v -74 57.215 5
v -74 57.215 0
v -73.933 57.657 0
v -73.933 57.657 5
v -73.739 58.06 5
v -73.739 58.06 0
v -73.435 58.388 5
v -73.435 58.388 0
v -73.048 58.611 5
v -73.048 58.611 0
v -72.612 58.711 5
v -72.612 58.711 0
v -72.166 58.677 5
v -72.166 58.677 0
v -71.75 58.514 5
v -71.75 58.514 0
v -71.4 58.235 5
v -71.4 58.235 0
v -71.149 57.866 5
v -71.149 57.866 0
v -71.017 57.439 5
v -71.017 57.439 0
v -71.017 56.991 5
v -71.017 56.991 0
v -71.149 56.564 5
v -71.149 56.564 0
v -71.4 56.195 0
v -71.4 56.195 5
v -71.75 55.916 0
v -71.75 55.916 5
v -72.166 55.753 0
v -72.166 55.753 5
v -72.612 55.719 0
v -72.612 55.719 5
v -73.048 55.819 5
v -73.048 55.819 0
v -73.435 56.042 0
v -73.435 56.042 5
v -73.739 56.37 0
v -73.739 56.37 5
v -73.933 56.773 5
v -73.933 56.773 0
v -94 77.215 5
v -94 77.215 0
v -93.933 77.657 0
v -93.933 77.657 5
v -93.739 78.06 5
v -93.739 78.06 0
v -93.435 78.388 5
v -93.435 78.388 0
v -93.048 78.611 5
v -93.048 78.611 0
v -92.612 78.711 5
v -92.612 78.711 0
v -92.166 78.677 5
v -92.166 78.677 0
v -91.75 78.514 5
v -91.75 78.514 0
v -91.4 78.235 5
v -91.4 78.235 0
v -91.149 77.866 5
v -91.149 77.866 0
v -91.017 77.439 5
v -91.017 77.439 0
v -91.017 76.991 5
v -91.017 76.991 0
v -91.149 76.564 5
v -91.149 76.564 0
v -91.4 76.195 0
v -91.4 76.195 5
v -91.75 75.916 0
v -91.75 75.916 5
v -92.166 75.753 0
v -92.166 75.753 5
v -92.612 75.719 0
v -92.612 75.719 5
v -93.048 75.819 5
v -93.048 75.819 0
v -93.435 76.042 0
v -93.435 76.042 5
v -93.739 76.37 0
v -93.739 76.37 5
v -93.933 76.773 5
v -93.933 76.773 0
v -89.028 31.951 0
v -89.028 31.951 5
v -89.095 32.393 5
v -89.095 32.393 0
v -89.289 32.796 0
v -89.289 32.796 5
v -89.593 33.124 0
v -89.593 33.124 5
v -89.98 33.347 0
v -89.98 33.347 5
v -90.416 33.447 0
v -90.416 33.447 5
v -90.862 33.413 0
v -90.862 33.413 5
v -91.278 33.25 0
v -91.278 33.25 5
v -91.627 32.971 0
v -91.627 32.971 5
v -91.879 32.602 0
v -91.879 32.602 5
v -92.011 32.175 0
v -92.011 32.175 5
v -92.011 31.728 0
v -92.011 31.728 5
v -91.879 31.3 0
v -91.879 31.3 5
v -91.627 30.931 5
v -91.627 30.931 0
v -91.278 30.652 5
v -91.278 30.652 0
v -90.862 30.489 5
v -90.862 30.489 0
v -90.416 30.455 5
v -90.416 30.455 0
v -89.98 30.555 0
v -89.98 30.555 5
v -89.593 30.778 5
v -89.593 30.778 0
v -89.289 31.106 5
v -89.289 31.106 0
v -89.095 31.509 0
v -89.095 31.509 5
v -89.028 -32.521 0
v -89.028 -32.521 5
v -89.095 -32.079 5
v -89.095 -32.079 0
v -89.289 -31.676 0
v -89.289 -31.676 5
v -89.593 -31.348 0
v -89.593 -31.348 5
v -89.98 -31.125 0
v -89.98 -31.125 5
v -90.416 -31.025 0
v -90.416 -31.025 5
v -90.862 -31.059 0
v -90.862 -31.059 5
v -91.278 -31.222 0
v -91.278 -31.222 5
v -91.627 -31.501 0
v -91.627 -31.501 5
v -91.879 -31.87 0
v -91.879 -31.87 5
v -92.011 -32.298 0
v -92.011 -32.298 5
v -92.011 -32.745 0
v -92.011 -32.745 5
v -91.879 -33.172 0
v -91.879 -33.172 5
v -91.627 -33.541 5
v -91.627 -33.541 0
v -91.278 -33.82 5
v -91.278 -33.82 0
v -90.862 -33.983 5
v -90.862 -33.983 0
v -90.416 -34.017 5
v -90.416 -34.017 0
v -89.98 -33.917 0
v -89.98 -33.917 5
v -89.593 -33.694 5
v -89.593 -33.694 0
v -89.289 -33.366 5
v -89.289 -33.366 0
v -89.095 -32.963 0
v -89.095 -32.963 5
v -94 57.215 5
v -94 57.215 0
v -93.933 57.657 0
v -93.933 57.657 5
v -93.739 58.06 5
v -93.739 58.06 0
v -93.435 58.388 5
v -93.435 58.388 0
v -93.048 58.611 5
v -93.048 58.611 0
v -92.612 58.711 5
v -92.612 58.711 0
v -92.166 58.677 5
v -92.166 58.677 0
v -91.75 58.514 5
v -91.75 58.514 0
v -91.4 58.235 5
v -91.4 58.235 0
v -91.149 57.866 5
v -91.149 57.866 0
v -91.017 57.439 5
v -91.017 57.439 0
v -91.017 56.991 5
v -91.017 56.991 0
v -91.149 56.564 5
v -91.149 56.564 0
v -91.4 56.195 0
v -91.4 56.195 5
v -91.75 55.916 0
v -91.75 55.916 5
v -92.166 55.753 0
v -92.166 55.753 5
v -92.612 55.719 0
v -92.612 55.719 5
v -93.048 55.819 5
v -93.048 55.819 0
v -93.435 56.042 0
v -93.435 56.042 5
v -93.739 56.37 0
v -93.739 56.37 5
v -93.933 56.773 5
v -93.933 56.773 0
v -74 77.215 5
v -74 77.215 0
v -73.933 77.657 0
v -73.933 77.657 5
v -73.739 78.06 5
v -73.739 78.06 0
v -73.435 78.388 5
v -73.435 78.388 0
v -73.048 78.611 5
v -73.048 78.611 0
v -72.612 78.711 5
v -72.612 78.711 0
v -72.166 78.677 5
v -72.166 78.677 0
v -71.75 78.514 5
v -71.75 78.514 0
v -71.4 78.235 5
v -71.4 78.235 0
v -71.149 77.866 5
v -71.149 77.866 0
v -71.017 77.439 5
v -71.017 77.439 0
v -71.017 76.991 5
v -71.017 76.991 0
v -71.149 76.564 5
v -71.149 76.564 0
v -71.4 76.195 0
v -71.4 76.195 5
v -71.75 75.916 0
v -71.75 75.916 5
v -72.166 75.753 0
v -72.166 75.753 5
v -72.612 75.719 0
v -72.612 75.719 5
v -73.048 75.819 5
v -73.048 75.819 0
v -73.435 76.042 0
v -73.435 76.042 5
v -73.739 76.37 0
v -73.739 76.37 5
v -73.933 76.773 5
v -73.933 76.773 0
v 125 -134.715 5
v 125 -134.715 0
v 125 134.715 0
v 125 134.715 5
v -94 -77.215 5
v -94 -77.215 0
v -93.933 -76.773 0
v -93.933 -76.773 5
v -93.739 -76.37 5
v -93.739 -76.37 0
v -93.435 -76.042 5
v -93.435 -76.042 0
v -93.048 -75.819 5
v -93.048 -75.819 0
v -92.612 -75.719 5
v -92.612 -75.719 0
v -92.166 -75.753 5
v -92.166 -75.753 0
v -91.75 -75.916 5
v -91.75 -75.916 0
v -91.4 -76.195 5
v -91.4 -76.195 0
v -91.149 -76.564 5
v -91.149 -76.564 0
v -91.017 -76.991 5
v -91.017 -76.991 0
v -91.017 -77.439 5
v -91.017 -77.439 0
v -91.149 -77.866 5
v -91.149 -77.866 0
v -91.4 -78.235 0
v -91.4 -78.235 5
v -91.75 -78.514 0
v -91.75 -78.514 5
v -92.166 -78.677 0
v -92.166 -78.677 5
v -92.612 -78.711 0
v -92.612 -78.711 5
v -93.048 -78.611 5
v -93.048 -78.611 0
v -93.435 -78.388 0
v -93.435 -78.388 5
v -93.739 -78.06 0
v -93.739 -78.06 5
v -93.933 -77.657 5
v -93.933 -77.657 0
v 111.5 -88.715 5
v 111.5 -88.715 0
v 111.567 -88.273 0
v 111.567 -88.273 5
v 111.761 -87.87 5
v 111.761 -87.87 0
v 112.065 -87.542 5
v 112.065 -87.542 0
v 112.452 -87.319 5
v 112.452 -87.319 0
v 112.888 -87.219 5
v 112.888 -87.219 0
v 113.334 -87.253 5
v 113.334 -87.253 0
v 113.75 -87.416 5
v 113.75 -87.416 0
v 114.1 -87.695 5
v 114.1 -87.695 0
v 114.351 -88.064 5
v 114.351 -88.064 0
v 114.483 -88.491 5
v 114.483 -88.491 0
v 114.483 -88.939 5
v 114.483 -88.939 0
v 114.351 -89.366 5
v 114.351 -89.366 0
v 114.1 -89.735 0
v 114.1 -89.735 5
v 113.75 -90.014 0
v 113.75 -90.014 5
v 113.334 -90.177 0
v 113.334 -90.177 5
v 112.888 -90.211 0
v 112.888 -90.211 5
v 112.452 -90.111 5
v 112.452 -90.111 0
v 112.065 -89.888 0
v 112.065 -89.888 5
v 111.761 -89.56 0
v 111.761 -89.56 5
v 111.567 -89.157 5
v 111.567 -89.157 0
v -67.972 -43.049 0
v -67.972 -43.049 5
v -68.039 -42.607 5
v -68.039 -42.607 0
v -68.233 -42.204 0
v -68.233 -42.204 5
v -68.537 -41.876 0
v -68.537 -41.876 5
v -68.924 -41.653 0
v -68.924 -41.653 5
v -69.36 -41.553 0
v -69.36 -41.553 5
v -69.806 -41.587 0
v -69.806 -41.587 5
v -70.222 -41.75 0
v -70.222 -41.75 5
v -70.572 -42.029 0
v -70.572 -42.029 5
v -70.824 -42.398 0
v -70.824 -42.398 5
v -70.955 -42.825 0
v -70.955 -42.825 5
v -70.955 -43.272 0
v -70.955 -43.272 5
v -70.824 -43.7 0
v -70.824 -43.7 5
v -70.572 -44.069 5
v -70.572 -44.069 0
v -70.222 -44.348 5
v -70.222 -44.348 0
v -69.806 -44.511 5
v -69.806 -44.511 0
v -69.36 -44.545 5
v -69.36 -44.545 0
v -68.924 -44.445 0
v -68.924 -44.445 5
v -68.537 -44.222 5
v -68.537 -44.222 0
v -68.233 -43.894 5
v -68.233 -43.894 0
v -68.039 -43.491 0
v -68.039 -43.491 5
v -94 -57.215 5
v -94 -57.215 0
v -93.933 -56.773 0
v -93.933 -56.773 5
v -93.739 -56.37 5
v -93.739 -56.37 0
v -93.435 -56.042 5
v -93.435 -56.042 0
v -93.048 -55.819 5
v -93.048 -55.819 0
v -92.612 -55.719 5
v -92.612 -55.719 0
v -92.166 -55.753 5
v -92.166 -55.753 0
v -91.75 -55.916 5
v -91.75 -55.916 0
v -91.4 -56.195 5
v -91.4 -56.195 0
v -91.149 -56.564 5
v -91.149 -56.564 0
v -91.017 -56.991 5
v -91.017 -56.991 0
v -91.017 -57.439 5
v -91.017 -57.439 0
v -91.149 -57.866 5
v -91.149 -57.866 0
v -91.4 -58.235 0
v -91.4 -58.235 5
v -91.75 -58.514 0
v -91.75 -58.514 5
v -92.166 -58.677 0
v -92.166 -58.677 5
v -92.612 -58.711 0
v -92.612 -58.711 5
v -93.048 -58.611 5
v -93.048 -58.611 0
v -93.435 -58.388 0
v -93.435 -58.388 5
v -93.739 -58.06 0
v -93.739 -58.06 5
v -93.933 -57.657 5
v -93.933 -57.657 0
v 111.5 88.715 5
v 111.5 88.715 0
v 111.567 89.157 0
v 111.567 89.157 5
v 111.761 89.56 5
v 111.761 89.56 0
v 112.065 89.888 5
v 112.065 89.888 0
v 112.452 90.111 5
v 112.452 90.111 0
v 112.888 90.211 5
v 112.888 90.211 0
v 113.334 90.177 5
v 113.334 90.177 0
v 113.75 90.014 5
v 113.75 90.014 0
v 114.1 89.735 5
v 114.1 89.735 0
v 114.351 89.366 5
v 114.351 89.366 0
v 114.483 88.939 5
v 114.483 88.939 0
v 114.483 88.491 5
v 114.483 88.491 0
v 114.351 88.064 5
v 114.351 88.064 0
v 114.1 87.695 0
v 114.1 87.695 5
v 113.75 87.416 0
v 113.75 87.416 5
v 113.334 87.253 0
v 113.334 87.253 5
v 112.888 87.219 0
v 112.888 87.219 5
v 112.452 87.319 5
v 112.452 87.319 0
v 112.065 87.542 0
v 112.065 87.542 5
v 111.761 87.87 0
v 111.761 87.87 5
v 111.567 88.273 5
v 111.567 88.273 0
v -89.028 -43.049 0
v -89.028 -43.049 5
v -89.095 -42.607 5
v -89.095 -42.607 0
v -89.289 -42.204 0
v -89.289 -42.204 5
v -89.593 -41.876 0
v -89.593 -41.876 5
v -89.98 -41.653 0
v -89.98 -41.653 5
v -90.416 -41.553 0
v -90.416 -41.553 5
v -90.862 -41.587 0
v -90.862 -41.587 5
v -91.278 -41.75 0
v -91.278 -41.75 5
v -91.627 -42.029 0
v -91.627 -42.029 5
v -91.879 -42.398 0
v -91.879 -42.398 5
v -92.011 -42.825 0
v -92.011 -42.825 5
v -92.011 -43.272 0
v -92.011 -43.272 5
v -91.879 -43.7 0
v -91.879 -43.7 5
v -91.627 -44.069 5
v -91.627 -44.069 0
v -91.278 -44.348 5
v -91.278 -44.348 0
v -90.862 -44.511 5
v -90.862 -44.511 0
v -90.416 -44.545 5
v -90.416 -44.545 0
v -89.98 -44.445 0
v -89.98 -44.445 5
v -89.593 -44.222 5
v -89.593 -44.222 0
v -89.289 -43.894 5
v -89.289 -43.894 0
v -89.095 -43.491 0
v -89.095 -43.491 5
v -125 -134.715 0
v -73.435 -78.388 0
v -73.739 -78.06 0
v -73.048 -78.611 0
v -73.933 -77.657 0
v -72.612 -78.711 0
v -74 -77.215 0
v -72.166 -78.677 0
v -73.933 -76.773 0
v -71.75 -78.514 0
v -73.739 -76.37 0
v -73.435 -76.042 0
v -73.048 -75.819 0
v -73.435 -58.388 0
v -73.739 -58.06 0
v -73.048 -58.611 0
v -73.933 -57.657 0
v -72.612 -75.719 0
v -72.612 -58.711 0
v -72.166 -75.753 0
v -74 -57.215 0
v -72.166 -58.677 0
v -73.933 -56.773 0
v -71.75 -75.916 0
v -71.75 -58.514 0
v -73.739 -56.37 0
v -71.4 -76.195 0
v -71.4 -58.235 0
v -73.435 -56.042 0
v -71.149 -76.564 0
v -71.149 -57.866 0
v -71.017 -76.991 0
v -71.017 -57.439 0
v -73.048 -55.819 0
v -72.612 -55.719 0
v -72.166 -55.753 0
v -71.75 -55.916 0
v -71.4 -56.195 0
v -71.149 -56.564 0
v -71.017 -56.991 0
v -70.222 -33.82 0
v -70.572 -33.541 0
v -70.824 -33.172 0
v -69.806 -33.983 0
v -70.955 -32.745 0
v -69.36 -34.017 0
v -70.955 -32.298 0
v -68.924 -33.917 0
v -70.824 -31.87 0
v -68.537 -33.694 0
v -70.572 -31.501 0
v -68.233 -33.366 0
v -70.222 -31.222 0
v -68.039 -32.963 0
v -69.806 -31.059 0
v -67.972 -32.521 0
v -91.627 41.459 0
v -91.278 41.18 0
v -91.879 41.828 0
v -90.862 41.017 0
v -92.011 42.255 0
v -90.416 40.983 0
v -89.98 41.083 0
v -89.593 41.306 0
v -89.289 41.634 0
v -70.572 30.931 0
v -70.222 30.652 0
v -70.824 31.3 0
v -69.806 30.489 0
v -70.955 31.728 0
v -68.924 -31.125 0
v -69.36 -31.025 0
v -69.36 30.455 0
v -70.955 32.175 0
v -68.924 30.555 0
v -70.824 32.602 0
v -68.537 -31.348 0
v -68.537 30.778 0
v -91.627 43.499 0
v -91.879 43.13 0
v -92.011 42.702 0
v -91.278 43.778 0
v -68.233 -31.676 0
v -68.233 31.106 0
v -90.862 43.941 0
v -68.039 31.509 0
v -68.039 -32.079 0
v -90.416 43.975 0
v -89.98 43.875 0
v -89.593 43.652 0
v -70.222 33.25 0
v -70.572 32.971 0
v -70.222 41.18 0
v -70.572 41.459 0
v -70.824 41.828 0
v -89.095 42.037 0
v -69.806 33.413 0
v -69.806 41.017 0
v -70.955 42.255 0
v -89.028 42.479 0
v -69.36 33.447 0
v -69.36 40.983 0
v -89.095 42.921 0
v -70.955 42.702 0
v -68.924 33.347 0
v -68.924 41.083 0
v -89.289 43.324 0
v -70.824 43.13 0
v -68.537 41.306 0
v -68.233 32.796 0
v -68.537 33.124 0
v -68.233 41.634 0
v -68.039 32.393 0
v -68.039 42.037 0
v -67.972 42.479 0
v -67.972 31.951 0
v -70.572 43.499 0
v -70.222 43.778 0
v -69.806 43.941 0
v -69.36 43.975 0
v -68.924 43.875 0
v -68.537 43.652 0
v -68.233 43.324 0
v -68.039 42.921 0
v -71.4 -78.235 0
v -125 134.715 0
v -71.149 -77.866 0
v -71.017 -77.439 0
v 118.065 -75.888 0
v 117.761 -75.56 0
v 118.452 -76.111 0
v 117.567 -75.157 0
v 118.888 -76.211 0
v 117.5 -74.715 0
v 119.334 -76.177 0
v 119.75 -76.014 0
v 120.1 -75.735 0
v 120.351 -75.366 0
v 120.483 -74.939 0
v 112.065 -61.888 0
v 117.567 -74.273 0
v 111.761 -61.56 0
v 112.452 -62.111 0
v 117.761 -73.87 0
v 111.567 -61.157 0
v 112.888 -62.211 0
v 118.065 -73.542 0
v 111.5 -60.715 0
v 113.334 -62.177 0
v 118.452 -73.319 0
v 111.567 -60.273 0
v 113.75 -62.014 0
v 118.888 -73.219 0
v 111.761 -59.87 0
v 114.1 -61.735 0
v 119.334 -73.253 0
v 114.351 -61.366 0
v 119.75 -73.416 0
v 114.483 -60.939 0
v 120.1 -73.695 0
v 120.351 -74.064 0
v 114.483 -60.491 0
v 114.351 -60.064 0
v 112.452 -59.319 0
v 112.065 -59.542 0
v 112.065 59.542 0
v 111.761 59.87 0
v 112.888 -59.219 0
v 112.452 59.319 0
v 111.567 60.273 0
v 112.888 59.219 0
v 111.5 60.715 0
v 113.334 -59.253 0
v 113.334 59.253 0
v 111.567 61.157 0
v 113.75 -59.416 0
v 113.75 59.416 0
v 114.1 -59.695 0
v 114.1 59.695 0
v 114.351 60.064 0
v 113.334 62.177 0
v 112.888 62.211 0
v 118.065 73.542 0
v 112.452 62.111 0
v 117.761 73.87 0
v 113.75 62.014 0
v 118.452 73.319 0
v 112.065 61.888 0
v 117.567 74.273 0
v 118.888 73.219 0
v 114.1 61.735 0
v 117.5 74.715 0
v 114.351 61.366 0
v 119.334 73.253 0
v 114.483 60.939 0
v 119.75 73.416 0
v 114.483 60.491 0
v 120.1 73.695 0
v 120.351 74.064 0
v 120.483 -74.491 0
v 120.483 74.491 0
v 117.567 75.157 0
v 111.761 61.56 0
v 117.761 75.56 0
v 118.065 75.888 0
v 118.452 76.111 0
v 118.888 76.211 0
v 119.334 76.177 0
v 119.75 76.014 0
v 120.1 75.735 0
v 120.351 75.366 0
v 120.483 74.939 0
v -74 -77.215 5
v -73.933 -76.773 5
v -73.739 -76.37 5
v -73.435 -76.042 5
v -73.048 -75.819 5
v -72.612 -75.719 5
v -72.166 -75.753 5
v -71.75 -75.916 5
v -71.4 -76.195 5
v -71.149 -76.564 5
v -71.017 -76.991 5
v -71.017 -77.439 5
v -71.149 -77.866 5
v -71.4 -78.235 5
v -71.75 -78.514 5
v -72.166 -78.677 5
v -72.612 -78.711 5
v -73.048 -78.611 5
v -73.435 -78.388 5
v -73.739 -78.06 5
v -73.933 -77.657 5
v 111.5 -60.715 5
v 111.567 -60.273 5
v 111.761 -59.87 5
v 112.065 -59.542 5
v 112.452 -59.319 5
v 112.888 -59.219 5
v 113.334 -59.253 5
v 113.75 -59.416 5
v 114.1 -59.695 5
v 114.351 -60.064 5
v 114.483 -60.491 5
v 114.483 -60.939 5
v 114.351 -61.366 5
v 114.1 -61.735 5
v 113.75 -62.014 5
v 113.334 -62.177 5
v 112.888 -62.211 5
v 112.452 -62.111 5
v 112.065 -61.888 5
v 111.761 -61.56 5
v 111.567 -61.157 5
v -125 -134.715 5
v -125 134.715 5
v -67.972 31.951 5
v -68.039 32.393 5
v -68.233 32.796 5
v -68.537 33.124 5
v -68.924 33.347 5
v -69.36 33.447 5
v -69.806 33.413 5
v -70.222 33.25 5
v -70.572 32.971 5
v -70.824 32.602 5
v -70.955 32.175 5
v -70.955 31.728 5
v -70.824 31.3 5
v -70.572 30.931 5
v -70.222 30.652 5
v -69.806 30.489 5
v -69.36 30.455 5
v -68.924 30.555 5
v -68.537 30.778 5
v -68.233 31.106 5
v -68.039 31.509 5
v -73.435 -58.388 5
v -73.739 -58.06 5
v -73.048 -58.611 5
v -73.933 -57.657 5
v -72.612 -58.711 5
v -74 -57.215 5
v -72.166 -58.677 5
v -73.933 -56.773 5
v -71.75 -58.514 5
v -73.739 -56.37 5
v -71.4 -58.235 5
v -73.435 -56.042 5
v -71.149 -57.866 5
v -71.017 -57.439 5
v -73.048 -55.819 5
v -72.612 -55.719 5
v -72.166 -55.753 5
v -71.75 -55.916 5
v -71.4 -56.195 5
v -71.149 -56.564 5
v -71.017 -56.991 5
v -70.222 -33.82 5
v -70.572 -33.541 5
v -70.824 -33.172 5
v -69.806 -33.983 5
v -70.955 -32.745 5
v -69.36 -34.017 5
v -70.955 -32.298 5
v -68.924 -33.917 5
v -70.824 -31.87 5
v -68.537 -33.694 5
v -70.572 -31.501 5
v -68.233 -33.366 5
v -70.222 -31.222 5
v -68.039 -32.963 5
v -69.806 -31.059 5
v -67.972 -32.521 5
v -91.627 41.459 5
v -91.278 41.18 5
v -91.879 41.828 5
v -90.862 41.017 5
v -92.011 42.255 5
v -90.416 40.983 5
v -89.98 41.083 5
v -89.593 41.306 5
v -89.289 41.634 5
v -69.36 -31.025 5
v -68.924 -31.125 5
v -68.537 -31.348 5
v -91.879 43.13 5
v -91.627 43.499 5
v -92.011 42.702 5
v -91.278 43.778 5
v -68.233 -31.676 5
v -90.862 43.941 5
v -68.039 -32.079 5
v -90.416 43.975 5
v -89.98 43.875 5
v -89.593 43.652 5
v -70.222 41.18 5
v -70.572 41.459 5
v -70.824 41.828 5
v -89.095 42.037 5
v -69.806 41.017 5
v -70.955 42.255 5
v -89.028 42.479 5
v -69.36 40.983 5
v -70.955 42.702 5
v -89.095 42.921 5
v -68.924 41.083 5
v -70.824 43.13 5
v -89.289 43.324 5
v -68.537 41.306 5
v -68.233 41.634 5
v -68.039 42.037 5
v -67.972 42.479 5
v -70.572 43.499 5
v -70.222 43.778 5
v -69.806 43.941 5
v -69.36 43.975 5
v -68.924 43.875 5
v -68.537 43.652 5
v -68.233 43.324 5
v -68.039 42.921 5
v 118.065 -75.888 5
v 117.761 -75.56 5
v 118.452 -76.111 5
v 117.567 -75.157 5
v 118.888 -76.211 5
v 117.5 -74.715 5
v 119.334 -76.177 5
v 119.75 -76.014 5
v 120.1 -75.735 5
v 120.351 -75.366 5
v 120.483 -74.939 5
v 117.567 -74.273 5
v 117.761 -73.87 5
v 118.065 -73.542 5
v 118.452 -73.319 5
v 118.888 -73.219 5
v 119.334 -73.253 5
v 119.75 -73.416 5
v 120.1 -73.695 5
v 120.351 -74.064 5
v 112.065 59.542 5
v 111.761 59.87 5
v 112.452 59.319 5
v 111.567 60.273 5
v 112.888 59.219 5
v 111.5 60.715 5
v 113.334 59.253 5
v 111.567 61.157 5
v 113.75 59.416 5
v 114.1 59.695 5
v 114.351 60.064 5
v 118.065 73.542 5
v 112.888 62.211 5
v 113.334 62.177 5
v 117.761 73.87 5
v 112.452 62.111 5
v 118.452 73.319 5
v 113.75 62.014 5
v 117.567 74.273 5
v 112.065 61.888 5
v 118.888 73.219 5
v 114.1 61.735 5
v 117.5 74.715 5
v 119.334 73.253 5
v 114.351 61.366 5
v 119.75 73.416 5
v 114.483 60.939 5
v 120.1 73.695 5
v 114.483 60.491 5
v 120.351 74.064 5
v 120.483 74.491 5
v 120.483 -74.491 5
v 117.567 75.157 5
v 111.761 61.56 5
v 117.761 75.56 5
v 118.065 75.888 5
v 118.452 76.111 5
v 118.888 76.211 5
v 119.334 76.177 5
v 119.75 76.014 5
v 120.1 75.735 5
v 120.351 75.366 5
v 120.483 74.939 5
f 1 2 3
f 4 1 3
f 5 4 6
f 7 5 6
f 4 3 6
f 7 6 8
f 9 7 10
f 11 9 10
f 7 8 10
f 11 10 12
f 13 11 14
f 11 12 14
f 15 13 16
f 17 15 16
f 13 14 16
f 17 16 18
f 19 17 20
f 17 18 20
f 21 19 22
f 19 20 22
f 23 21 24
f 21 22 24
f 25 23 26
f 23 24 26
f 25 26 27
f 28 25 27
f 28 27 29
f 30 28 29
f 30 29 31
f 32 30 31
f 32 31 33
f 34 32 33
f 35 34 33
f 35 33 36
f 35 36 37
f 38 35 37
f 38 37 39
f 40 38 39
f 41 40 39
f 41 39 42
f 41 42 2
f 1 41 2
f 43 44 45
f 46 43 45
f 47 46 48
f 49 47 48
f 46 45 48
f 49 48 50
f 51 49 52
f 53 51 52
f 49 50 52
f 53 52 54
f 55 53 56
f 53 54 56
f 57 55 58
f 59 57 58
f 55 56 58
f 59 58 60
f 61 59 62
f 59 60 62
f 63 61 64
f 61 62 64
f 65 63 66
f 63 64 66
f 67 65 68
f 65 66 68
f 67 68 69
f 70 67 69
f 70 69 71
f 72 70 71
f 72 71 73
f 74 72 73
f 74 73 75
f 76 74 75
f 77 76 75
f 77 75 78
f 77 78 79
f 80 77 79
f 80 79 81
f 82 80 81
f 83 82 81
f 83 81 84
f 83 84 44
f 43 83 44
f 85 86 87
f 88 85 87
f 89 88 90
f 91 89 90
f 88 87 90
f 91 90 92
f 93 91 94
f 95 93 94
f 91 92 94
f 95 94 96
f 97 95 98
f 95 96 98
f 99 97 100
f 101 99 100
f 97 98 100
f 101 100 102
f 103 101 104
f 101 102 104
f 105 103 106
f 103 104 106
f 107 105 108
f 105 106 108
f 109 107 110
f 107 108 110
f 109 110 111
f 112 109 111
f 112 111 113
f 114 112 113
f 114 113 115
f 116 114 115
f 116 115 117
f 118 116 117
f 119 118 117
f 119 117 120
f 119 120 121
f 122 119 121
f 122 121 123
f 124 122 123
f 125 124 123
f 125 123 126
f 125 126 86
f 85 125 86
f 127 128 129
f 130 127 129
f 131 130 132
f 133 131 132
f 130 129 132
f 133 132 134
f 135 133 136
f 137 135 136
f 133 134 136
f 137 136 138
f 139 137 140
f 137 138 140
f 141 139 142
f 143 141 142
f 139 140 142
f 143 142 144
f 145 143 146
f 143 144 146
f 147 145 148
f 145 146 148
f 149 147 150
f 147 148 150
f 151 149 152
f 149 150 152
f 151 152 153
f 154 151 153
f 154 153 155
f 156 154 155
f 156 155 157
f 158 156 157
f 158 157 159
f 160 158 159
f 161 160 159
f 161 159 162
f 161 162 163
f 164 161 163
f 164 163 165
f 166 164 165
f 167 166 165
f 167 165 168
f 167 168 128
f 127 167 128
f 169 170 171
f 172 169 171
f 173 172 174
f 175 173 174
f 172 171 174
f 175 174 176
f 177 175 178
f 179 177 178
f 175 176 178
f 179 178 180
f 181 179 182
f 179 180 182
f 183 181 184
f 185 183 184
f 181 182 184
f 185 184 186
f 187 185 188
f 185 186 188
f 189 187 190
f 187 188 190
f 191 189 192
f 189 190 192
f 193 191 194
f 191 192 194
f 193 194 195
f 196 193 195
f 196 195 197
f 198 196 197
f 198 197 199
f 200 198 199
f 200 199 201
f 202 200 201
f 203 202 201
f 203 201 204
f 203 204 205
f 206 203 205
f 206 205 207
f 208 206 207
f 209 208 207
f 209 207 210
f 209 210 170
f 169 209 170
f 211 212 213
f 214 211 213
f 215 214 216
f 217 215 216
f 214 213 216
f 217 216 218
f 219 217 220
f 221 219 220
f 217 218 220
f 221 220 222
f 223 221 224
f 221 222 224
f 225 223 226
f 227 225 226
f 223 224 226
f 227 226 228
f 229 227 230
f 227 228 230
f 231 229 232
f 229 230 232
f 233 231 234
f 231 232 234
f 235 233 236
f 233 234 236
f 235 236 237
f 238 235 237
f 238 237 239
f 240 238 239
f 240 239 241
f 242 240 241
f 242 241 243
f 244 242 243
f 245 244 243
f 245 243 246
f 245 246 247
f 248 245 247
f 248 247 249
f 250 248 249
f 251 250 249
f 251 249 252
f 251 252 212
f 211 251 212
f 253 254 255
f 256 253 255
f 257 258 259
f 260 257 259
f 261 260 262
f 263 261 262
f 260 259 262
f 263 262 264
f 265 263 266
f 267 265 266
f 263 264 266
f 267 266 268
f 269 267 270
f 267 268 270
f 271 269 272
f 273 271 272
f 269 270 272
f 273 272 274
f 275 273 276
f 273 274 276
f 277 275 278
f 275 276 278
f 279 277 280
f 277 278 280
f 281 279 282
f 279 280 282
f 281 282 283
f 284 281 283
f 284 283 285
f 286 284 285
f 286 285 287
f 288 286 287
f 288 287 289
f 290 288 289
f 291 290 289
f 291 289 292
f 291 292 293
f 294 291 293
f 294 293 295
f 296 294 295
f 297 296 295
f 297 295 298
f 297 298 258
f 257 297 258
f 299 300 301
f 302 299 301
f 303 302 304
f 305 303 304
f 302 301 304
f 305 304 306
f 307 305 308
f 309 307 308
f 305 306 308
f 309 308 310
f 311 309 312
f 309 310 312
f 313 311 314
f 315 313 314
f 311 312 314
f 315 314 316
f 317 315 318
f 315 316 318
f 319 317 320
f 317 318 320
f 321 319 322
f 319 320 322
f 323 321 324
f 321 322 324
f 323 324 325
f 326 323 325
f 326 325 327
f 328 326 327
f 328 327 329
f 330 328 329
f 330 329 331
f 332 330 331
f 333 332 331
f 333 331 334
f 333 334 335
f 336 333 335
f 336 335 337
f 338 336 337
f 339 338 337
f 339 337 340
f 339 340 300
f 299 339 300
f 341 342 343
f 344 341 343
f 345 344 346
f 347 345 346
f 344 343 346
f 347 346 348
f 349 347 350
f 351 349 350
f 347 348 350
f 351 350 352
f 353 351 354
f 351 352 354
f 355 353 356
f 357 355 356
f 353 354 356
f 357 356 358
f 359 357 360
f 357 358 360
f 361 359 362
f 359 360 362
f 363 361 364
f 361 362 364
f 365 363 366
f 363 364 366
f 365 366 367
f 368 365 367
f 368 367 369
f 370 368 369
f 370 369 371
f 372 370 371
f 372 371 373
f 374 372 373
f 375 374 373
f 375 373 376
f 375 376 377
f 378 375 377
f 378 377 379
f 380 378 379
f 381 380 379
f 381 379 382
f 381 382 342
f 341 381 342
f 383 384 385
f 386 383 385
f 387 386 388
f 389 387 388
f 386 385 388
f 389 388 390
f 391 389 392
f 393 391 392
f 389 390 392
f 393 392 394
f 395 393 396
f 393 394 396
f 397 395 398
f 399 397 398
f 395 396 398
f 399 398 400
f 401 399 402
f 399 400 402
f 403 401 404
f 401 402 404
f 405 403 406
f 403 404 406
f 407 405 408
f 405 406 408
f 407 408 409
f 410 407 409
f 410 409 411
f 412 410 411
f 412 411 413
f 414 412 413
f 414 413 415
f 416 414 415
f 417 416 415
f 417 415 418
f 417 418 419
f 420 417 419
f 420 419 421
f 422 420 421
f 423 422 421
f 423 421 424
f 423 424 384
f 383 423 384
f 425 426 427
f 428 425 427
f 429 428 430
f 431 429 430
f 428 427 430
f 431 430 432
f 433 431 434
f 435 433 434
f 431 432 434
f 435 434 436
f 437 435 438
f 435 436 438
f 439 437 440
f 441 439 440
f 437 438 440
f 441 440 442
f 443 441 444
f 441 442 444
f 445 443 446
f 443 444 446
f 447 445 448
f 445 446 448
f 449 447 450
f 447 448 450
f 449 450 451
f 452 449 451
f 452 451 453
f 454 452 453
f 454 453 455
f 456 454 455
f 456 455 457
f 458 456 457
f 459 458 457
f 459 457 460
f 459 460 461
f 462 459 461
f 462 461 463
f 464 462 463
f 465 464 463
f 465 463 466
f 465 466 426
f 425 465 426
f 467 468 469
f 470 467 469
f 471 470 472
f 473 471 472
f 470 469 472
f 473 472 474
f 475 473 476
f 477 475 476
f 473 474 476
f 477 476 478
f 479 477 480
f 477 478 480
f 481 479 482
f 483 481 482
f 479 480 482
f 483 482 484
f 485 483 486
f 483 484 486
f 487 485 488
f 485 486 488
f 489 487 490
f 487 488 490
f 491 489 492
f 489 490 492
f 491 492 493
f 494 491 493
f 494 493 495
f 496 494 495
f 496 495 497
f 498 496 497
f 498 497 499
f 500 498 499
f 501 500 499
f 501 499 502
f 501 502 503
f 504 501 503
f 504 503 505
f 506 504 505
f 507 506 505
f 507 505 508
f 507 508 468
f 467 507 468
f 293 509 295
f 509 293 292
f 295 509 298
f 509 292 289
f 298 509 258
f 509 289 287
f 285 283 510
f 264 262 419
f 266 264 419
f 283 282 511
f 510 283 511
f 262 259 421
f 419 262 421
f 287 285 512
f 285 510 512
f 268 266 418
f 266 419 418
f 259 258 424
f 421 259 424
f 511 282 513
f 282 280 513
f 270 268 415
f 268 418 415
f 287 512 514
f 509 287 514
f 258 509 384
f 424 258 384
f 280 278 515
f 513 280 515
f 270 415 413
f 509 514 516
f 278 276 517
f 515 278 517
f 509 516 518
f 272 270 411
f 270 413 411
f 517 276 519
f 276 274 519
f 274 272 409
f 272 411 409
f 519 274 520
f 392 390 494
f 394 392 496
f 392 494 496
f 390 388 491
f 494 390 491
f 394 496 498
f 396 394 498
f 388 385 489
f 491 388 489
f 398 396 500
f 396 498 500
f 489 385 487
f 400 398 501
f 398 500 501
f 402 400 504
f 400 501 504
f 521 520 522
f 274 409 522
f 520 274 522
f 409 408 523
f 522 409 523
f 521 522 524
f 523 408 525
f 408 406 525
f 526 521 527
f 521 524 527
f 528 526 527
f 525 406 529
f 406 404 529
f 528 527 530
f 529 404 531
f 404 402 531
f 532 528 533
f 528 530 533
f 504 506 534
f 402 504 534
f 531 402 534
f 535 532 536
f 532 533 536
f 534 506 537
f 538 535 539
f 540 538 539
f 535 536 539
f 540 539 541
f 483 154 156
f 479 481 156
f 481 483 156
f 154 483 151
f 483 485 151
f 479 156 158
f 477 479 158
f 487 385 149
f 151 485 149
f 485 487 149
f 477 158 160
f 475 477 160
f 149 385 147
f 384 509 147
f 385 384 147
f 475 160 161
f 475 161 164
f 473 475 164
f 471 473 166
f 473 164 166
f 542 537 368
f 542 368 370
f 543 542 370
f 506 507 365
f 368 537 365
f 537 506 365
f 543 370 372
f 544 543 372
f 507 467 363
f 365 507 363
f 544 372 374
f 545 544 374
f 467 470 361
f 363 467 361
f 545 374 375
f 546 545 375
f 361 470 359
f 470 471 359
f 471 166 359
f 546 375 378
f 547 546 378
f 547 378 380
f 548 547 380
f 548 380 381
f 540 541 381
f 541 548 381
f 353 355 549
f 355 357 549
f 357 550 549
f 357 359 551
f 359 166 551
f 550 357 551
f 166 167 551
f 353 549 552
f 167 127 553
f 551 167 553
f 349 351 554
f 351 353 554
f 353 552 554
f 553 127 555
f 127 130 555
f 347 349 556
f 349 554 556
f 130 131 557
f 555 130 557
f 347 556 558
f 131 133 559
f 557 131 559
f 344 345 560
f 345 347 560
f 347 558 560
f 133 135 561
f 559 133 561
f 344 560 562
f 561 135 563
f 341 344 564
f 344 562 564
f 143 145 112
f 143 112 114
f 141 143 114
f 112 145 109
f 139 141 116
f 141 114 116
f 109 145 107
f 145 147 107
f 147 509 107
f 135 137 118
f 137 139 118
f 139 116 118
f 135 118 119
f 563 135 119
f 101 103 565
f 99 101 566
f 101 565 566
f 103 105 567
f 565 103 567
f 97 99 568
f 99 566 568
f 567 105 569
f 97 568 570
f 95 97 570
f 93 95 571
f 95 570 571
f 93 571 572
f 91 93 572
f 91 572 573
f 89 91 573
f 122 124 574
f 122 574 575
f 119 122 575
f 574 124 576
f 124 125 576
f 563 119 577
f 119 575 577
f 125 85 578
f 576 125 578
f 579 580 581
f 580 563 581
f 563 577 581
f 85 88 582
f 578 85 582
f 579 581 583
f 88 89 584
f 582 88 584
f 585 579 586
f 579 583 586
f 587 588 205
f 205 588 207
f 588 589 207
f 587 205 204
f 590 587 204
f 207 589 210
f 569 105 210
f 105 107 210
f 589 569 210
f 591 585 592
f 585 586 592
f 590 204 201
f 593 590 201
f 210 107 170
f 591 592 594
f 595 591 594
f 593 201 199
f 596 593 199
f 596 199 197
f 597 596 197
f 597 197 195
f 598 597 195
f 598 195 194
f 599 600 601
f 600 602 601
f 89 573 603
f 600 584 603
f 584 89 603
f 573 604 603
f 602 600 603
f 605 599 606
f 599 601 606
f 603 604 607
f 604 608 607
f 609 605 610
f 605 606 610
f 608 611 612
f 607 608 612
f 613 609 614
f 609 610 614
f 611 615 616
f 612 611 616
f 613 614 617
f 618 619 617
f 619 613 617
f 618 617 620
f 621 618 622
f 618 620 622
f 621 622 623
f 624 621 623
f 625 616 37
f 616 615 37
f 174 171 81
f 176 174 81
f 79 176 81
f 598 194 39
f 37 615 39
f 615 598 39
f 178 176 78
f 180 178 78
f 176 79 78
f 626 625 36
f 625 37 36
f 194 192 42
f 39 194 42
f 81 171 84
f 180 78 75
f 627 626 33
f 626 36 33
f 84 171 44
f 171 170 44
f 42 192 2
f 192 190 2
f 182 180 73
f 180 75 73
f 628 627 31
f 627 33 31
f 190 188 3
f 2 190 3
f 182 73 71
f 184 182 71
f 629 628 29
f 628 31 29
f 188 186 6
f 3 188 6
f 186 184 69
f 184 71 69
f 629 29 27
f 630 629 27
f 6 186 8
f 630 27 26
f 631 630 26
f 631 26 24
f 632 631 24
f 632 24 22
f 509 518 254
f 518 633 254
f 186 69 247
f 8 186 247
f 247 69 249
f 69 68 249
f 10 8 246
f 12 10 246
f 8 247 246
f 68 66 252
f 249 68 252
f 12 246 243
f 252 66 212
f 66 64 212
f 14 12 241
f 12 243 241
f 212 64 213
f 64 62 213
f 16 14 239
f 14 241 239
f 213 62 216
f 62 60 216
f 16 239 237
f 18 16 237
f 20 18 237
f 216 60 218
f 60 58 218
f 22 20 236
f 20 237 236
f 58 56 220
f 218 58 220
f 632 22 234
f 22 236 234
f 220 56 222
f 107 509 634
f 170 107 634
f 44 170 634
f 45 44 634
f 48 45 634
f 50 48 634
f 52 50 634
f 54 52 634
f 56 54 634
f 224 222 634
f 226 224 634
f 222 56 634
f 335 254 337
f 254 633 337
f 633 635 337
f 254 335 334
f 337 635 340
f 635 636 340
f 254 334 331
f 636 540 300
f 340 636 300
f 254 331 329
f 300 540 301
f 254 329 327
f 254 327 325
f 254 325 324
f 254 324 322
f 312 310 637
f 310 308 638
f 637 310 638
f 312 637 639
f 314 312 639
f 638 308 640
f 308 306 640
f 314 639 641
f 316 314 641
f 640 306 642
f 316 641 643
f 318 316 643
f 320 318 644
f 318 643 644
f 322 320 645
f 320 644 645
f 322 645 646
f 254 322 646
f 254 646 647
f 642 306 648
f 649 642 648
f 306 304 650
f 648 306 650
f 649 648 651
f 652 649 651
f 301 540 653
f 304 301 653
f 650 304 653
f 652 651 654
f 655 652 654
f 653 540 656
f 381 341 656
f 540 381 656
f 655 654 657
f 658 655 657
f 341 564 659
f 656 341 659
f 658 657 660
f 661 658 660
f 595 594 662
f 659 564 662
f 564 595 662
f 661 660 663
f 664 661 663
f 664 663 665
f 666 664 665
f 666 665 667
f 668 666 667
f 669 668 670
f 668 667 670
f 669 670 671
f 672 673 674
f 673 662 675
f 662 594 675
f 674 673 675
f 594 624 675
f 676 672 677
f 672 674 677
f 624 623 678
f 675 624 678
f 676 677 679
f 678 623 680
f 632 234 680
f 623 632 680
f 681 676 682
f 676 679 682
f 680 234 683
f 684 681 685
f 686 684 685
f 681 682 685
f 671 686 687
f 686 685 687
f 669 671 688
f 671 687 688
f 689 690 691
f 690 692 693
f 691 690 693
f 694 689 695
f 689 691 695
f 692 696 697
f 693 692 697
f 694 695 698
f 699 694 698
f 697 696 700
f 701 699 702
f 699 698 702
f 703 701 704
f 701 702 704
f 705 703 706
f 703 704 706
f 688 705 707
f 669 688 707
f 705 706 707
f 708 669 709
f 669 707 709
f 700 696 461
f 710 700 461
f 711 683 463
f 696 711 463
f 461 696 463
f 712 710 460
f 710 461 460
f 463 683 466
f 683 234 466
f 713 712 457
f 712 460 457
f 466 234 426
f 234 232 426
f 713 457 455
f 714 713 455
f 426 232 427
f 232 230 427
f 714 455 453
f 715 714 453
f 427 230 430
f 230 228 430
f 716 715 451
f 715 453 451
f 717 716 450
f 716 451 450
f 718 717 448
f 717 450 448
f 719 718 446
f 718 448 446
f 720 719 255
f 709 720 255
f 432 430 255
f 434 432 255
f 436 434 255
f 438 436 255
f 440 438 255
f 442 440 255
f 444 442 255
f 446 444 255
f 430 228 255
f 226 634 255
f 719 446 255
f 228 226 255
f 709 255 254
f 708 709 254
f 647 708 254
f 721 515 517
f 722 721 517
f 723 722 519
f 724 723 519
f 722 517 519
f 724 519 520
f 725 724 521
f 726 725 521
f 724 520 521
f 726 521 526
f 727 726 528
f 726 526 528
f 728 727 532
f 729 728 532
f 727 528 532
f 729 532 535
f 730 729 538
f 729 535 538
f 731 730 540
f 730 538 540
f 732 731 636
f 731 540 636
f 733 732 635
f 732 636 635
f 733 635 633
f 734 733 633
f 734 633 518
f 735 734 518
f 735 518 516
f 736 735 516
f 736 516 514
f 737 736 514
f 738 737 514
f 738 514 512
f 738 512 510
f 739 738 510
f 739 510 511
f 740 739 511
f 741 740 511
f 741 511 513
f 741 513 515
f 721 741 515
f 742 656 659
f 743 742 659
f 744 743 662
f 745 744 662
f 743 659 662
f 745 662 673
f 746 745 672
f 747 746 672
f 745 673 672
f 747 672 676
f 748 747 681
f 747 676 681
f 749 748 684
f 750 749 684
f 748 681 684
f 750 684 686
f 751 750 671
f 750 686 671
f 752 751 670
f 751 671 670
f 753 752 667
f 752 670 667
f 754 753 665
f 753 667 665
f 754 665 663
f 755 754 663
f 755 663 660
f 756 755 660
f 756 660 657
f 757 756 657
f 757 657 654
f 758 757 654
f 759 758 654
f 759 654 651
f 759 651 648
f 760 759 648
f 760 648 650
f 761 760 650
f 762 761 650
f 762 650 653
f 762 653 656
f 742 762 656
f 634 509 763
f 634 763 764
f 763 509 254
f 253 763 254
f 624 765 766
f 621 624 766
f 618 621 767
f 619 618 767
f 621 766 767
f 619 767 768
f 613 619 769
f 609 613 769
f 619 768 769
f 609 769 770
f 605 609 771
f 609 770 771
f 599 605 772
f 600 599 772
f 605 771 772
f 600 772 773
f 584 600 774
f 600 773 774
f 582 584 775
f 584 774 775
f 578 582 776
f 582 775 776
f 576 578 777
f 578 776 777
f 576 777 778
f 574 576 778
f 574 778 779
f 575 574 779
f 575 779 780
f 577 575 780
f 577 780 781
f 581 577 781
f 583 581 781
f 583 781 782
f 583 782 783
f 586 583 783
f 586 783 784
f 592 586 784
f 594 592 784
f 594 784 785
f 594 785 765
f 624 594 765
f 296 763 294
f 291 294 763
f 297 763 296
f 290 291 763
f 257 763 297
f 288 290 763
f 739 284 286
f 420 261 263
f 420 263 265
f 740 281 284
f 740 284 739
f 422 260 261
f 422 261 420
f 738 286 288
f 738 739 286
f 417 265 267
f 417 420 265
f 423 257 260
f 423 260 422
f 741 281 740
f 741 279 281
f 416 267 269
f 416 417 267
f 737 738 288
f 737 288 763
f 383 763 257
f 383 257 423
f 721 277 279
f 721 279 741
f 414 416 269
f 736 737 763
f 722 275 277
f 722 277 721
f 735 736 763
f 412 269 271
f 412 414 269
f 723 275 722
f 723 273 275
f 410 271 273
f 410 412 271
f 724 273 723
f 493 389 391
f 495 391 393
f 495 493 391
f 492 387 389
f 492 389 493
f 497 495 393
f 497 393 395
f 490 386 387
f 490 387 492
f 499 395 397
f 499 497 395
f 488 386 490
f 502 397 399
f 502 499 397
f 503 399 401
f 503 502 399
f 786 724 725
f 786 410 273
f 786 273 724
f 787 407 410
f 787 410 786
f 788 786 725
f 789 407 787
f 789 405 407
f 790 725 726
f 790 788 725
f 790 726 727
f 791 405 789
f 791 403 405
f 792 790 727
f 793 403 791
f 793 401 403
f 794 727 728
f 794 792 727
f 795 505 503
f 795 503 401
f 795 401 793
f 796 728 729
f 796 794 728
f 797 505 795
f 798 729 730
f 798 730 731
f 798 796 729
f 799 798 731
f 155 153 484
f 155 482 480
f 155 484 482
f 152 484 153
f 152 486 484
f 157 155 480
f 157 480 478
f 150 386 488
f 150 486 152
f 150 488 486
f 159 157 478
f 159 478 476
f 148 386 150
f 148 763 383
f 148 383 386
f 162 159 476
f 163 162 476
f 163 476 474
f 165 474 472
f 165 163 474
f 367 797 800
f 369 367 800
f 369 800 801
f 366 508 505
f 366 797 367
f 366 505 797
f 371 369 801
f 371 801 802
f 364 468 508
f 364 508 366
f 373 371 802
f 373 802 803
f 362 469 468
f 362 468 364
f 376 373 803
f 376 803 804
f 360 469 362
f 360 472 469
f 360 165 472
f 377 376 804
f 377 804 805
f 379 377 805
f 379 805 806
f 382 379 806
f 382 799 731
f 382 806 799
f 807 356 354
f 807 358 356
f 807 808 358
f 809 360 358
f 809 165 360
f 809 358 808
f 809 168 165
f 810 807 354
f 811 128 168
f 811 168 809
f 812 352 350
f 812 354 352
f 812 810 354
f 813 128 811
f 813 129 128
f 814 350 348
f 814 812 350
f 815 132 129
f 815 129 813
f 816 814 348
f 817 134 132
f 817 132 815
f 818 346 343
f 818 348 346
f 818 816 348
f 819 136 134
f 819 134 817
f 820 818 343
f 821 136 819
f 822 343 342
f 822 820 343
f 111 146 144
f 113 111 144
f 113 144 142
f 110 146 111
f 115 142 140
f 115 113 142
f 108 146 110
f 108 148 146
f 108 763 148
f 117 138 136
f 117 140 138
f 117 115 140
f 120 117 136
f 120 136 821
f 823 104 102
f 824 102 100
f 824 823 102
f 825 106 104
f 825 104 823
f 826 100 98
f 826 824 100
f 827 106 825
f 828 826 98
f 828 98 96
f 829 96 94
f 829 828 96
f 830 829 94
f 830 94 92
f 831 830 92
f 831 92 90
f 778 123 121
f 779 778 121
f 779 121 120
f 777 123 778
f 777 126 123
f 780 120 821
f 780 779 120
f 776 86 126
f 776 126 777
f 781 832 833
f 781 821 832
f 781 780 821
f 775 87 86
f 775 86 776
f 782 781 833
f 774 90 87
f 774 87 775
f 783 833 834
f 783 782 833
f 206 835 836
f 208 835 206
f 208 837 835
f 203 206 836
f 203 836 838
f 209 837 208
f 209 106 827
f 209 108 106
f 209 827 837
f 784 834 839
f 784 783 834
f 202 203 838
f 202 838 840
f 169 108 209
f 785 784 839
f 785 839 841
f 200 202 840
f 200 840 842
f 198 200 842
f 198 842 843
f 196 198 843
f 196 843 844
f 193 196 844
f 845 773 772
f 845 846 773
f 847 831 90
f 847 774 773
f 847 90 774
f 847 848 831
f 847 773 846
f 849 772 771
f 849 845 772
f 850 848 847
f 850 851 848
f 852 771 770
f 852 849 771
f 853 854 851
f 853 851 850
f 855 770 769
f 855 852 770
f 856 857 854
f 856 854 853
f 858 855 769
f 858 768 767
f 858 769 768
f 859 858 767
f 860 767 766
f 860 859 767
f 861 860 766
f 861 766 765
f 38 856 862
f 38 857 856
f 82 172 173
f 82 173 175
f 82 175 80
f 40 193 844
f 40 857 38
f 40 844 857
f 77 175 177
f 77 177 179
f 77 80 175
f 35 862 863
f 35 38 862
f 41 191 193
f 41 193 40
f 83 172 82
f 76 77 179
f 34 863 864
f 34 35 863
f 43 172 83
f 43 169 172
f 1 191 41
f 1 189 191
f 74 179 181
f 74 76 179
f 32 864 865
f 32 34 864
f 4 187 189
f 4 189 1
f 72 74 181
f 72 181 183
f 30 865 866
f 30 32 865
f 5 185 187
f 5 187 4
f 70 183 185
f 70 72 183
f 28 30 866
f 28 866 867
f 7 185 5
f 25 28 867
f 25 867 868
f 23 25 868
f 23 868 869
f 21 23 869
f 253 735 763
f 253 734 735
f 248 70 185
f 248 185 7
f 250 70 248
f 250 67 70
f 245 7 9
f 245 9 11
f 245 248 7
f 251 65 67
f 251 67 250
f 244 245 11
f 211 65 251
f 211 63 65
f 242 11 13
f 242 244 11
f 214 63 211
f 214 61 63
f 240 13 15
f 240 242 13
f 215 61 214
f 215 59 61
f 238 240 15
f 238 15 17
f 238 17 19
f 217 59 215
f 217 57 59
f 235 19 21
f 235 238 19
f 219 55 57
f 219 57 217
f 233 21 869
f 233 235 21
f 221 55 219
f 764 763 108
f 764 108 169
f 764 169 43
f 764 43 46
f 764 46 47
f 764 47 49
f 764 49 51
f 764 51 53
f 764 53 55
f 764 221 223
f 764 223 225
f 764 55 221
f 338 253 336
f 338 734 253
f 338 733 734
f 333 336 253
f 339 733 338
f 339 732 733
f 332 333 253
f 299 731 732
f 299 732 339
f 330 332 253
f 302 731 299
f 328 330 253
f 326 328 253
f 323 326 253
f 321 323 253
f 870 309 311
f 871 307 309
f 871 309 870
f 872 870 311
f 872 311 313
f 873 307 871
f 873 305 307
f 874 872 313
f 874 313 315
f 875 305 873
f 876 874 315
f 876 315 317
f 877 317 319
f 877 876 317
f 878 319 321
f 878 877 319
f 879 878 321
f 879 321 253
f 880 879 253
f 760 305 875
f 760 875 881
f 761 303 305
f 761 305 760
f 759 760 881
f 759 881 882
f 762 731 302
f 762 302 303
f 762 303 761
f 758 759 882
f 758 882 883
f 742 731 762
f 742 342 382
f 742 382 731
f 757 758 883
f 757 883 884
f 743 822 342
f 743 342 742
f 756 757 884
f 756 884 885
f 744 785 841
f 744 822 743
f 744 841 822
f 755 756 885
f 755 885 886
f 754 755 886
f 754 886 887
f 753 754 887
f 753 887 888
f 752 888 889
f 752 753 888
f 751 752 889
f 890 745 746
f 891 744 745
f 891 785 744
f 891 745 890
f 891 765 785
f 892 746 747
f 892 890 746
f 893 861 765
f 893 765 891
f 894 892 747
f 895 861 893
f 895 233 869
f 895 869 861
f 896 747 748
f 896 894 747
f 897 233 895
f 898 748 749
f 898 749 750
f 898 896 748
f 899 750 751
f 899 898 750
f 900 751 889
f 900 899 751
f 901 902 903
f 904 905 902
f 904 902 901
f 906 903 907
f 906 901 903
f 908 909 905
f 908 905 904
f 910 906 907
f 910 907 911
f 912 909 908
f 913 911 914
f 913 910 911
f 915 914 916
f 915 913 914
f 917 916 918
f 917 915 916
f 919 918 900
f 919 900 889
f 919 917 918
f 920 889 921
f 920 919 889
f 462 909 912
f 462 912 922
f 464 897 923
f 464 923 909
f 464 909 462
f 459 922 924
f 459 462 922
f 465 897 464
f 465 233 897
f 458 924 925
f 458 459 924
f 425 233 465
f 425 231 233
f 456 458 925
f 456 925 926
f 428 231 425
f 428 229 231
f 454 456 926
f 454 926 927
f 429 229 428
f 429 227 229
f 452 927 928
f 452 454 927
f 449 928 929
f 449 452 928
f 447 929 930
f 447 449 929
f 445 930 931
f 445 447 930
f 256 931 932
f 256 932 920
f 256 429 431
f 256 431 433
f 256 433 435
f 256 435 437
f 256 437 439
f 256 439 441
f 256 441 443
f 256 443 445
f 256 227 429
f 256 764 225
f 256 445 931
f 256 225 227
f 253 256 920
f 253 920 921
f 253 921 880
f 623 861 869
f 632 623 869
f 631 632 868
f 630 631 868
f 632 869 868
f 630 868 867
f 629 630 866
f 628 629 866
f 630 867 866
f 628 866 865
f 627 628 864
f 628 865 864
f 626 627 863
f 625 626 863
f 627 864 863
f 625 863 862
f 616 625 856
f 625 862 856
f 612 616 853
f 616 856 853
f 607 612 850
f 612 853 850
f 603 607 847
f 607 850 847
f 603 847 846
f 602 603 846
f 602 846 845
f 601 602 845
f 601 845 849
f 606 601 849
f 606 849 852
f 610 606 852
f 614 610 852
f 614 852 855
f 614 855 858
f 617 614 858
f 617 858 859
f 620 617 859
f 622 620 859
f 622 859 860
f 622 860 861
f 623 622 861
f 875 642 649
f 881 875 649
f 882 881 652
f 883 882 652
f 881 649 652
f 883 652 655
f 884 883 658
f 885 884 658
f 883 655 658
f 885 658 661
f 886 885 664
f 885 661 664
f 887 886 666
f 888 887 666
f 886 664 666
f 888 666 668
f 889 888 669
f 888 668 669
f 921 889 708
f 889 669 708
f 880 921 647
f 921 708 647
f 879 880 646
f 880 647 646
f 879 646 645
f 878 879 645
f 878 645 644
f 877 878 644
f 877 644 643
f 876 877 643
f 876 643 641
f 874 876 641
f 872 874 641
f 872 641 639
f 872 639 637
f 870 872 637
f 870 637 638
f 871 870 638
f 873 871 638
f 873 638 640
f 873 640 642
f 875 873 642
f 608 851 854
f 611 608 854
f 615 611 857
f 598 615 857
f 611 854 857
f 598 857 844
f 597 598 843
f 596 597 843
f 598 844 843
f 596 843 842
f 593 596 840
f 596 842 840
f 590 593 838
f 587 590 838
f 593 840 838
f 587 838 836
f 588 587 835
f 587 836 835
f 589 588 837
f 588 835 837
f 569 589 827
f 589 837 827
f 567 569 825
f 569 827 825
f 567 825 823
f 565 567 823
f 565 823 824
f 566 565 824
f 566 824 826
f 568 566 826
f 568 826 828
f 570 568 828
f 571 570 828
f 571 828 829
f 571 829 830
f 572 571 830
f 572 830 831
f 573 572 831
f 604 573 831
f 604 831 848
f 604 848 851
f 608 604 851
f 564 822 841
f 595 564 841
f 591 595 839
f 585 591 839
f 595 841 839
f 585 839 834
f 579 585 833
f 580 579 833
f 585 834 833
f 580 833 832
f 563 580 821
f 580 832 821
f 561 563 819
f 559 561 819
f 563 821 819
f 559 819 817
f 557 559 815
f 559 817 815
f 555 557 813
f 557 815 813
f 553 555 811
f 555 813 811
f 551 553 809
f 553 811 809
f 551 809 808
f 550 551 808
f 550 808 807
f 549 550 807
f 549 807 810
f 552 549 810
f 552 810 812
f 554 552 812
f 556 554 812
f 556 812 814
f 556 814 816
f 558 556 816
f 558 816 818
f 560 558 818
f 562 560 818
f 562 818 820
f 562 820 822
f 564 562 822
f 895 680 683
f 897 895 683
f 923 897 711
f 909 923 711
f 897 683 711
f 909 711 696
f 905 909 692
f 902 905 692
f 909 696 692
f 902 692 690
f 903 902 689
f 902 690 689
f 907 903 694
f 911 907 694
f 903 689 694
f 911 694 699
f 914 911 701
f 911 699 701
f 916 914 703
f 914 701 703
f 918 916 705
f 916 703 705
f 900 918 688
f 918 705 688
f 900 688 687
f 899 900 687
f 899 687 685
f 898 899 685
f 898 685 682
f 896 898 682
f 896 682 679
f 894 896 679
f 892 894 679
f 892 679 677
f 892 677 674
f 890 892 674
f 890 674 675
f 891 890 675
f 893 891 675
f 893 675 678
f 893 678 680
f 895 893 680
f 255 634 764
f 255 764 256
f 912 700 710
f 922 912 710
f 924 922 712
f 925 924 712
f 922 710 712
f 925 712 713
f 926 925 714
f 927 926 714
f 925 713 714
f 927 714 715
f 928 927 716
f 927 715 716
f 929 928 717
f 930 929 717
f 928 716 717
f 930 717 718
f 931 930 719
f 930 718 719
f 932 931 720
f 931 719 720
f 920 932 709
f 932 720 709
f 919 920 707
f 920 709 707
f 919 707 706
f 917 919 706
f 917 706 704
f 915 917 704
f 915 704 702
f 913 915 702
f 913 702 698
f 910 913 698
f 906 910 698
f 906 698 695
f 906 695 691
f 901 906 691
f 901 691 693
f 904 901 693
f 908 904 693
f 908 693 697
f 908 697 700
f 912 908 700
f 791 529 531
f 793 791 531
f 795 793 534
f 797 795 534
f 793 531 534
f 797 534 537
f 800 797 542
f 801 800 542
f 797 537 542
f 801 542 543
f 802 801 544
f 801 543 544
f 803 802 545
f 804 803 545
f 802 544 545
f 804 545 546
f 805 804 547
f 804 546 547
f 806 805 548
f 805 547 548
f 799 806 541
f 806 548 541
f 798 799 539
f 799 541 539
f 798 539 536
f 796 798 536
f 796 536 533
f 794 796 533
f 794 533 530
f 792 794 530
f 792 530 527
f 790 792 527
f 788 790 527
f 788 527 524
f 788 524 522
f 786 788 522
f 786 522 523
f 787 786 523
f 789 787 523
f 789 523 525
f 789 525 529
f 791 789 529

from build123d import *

# Parameters (mm, degrees)
ESQUISSE1_W             = 250
ESQUISSE1_H             = 269.43
BOSS_EXTRU_1_DEPTH      = 5
ESQUISSE3_R             = 1.5
ENL_V_MAT_EXTRU_2_DEPTH = 184.84268064
ESQUISSE4_R             = 1.5
ENL_V_MAT_EXTRU_3_DEPTH = 184.84268064


with BuildPart() as part:
    # Esquisse1 → Boss.-Extru.1 (new body)
    with BuildSketch(Plane.XY):
        Rectangle(ESQUISSE1_W, ESQUISSE1_H)
    extrude(amount=BOSS_EXTRU_1_DEPTH)

    # Esquisse3 → Enlèv. mat.-Extru.2 (cut, through all)
    with BuildSketch(Plane(origin=(0, 0, 0), x_dir=(-1, 0, 0), z_dir=(0, 0, -1))):
        with Locations((72.5, 77.215)):
            Circle(ESQUISSE3_R)
        with Locations((92.5, 77.215)):
            Circle(ESQUISSE3_R)
        with Locations((92.5, 57.215)):
            Circle(ESQUISSE3_R)
        with Locations((72.5, 57.215)):
            Circle(ESQUISSE3_R)
        with Locations((72.5, -57.215)):
            Circle(ESQUISSE3_R)
        with Locations((92.5, -57.215)):
            Circle(ESQUISSE3_R)
        with Locations((72.5, -77.215)):
            Circle(ESQUISSE3_R)
        with Locations((92.5, -77.215)):
            Circle(ESQUISSE3_R)
        with Locations((-113, 88.715)):
            Circle(ESQUISSE3_R)
        with Locations((-119, 74.715)):
            Circle(ESQUISSE3_R)
        with Locations((-113, 60.715)):
            Circle(ESQUISSE3_R)
        with Locations((-113, -60.715)):
            Circle(ESQUISSE3_R)
        with Locations((-119, -74.715)):
            Circle(ESQUISSE3_R)
        with Locations((-113, -88.715)):
            Circle(ESQUISSE3_R)
    extrude(amount=-ENL_V_MAT_EXTRU_2_DEPTH, mode=Mode.SUBTRACT)

    # Esquisse4 → Enlèv. mat.-Extru.3 (cut, through all)
    with BuildSketch(Plane.XY.offset(5)):
        with Locations((-69.472135955, -43.048932022)):
            Circle(ESQUISSE4_R)
        with Locations((-69.472135955, -32.521067977)):
            Circle(ESQUISSE4_R)
        with Locations((-90.527864045, -43.048932022)):
            Circle(ESQUISSE4_R)
        with Locations((-90.527864045, -32.521067977)):
            Circle(ESQUISSE4_R)
        with Locations((-69.472135955, 31.951067978)):
            Circle(ESQUISSE4_R)
        with Locations((-90.527864045, 31.951067978)):
            Circle(ESQUISSE4_R)
        with Locations((-69.472135955, 42.478932023)):
            Circle(ESQUISSE4_R)
        with Locations((-90.527864045, 42.478932023)):
            Circle(ESQUISSE4_R)
    extrude(amount=-ENL_V_MAT_EXTRU_3_DEPTH, mode=Mode.SUBTRACT)


solid = part.part
